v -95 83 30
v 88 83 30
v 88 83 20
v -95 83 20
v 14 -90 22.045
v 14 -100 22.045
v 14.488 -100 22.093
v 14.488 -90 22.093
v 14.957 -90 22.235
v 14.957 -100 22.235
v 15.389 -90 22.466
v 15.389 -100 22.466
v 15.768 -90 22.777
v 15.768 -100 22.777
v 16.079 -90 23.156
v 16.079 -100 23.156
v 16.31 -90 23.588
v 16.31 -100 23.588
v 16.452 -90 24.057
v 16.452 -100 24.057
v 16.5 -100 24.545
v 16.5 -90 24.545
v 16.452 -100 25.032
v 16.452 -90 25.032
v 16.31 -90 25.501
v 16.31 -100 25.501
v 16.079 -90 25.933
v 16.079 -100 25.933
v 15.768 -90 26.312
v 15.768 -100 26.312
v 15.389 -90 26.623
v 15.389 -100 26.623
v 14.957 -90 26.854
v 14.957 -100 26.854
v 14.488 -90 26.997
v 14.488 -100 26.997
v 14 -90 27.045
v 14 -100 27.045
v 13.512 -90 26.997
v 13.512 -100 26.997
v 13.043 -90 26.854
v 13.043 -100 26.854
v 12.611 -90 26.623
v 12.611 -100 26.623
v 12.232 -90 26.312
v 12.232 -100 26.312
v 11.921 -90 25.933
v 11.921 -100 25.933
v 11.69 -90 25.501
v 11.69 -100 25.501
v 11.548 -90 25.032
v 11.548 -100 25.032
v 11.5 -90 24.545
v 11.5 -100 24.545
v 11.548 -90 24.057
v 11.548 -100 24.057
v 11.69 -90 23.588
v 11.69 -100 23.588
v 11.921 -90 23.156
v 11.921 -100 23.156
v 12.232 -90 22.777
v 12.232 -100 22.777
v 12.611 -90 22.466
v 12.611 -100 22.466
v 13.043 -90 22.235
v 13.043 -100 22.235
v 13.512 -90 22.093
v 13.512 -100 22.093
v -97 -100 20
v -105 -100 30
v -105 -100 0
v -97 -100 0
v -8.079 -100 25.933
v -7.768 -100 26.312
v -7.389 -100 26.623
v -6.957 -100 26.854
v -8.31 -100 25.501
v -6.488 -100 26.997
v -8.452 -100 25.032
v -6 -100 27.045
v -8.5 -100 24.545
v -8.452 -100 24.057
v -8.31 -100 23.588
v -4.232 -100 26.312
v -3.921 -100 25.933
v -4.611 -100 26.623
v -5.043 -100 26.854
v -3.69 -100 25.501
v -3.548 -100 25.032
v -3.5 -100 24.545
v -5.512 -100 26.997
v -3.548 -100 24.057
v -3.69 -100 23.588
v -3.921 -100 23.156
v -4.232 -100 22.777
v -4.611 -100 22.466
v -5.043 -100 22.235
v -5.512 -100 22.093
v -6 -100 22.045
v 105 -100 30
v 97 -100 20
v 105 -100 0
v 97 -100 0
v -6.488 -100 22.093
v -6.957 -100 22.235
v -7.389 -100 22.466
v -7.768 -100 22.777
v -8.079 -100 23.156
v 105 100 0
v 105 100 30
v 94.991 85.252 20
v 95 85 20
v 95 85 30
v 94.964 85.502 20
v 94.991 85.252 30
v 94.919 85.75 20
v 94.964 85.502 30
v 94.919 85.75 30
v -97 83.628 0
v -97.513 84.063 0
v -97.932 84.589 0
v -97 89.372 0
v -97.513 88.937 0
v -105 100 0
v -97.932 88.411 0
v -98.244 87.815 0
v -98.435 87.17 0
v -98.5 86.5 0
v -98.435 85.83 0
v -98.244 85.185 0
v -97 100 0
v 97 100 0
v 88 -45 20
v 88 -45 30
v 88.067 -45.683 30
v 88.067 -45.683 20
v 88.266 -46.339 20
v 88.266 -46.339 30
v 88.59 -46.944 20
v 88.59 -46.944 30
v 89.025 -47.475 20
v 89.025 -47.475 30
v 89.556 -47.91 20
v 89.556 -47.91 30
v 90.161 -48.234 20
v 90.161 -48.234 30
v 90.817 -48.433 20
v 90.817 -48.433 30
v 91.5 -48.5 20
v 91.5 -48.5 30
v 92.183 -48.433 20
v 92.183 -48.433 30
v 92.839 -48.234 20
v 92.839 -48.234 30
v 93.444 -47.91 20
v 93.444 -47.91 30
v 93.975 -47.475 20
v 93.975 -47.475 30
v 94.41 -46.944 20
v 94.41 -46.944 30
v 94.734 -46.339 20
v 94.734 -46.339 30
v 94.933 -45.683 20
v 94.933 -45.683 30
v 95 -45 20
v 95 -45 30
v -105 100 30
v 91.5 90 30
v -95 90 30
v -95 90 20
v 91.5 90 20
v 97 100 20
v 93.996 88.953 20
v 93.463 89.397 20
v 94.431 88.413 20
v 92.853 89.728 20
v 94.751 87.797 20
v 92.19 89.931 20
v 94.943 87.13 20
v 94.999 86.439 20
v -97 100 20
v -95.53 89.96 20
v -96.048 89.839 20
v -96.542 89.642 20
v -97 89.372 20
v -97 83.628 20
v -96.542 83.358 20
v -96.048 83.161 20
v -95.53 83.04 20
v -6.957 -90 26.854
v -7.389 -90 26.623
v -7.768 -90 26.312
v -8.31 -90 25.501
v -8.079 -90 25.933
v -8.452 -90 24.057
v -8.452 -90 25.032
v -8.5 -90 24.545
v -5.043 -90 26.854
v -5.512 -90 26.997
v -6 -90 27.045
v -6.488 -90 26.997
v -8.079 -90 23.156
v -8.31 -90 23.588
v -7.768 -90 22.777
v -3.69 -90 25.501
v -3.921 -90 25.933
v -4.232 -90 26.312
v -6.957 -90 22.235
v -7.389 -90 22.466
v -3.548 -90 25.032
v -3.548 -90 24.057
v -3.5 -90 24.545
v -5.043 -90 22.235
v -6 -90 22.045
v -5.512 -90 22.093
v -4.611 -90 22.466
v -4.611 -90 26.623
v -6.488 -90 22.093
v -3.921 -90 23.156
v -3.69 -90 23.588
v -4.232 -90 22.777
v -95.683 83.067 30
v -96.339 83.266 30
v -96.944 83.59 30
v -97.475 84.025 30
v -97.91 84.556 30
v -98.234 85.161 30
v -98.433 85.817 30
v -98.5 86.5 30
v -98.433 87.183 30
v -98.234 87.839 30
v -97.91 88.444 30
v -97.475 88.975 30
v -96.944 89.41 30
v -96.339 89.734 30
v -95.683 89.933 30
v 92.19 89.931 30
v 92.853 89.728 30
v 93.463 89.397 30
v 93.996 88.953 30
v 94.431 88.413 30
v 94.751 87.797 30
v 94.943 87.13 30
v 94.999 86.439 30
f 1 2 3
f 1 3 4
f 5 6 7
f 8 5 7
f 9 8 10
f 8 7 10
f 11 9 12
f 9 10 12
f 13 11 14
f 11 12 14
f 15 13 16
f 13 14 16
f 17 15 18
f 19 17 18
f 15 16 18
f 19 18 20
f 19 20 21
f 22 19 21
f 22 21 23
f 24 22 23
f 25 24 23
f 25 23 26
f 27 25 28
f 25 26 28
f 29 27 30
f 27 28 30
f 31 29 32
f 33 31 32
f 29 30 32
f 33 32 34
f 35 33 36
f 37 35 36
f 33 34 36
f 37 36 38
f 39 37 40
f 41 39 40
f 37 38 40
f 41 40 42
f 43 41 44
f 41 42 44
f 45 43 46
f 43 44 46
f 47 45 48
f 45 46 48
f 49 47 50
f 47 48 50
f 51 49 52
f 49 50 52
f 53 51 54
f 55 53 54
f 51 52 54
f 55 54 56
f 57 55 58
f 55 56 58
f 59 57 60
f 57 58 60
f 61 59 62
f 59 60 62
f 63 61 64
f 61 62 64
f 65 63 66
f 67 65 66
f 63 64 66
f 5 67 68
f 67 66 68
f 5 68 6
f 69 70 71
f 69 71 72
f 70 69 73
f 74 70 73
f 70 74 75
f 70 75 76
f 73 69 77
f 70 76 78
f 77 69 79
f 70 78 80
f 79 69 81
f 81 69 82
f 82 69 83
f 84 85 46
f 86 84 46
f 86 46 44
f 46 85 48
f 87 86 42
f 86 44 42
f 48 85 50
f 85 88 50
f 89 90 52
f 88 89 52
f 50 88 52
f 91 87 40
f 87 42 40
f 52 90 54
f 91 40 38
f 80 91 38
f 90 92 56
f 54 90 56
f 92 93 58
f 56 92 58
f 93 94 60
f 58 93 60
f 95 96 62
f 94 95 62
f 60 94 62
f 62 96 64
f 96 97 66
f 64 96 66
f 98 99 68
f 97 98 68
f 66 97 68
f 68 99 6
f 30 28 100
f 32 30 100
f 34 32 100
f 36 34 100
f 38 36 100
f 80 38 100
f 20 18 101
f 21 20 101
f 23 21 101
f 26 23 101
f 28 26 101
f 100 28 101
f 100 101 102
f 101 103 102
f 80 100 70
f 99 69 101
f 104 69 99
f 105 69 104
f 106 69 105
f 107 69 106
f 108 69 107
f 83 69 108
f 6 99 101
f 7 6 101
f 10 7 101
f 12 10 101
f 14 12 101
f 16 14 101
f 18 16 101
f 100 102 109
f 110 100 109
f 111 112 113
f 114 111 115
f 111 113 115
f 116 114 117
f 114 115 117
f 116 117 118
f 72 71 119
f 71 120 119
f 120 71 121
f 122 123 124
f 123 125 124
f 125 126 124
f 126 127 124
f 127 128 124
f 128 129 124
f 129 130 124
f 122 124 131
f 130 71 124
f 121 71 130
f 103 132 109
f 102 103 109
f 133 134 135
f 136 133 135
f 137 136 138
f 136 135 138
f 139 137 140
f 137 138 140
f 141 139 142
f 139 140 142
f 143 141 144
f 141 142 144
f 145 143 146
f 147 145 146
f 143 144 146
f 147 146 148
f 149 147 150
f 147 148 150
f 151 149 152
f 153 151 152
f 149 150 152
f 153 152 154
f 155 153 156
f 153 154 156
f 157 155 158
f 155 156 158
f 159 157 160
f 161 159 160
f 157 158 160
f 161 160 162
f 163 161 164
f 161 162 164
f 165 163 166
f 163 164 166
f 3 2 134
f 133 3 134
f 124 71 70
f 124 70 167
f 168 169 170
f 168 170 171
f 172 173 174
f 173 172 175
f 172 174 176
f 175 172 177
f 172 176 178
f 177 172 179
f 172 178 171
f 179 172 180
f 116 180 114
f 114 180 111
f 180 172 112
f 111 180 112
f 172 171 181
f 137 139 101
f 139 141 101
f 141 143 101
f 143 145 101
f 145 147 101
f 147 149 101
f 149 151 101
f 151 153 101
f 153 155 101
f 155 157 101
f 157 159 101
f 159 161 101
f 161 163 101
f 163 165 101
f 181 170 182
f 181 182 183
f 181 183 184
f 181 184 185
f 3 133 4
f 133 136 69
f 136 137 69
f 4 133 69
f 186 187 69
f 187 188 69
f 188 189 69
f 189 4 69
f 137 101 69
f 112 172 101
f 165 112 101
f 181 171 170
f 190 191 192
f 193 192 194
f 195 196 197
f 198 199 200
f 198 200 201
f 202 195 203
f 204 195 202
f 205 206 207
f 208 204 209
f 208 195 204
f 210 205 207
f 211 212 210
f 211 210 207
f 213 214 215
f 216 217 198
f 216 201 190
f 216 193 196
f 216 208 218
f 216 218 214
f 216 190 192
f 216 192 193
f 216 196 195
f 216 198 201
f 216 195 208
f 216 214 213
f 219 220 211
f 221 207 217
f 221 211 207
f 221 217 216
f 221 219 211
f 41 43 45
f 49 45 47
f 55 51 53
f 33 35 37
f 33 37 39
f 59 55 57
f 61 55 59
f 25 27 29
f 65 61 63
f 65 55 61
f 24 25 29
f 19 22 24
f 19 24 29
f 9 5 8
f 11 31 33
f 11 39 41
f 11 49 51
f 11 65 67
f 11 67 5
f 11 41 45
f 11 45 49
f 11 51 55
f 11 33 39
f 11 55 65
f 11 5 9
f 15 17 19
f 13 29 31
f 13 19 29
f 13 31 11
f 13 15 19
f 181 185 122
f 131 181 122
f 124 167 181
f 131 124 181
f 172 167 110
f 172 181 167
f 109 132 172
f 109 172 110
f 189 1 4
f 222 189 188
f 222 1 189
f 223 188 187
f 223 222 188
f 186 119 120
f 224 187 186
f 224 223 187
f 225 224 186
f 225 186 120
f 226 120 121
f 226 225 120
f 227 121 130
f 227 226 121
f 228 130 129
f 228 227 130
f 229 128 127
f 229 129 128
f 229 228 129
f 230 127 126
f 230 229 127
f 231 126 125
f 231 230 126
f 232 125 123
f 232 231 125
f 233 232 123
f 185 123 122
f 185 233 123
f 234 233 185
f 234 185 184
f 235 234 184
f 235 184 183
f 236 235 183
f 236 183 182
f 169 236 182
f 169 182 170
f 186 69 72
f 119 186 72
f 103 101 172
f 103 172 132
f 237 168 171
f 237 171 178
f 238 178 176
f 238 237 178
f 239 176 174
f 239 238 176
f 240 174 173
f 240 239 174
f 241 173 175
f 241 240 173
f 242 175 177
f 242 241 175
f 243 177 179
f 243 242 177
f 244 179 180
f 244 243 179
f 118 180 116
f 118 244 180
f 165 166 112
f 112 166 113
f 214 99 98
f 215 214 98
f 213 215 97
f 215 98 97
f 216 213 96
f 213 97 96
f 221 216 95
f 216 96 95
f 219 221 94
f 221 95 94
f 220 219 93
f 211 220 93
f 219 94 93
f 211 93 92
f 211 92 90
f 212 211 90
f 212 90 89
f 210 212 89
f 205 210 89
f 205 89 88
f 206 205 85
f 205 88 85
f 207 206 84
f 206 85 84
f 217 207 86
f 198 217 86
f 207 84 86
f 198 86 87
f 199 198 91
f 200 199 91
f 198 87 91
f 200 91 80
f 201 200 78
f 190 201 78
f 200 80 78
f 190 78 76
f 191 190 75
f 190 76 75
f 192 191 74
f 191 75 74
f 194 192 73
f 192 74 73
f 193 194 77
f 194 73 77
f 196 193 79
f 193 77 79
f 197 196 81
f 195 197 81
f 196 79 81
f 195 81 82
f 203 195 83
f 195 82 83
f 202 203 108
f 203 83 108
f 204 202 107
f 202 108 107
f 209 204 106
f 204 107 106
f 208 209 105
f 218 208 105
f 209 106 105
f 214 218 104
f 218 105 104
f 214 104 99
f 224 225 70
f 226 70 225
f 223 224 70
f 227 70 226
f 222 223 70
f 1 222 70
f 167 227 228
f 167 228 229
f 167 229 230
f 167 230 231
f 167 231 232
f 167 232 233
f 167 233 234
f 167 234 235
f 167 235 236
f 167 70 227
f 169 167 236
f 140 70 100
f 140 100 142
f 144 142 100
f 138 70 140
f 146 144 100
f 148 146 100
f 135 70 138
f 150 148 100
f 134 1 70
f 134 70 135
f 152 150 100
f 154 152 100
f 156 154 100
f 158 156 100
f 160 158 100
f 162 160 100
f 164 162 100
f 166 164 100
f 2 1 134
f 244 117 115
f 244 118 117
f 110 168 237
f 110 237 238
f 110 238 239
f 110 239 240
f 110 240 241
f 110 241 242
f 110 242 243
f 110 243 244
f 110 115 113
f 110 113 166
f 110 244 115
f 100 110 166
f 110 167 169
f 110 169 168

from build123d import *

# Parameters (mm, degrees)
SKETCH1_W           = 210
SKETCH1_H           = 200
BOSS_EXTRUDE1_DEPTH = 30
SKETCH2_W           = 194
SKETCH2_H           = 20
CUT_EXTRUDE1_DEPTH  = 228.870577302
CUT_EXTRUDE2_DEPTH  = 149.07092895
CUT_EXTRUDE3_DEPTH  = 149.07092895
SKETCH5_R           = 2.5
CUT_EXTRUDE4_DEPTH  = 10


with BuildPart() as part:
    # Sketch1 → Boss-Extrude1 (new body)
    with BuildSketch(Plane.XY):
        Rectangle(SKETCH1_W, SKETCH1_H)
    extrude(amount=BOSS_EXTRUDE1_DEPTH)

    # Sketch2 → Cut-Extrude1 (cut, through all)
    with BuildSketch(Plane(origin=(0, -100, 0), x_dir=(-1, 0, 0), z_dir=(0, -1, 0))):
        with Locations((0, -10)):
            Rectangle(SKETCH2_W, SKETCH2_H)
    extrude(amount=-CUT_EXTRUDE1_DEPTH, mode=Mode.SUBTRACT)

    # Sketch3 → Cut-Extrude2 (cut, through all)
    with BuildSketch(Plane.XY.offset(30)):
        with BuildLine():
            Line((88, 85), (88, -45))
            ThreePointArc((88, -45), (91.5, -48.5), (95, -45))
            Line((95, -45), (95, 85))
            ThreePointArc((95, 85), (91.5, 88.5), (88, 85))
        make_face()
    extrude(amount=-CUT_EXTRUDE2_DEPTH, mode=Mode.SUBTRACT)

    # Sketch4 → Cut-Extrude3 (cut, through all)
    with BuildSketch(Plane.XY.offset(30)):
        with BuildLine():
            Line((91.5, 83), (-95, 83))
            ThreePointArc((-95, 83), (-98.5, 86.5), (-95, 90))
            Line((-95, 90), (91.5, 90))
            ThreePointArc((91.5, 90), (95, 86.5), (91.5, 83))
        make_face()
    extrude(amount=-CUT_EXTRUDE3_DEPTH, mode=Mode.SUBTRACT)

    # Sketch5 → Cut-Extrude4 (cut)
    with BuildSketch(Plane.XZ.offset(100)):
        with Locations(Location((-6, 24.544570078, 0), (0, 0, 270))):
            Circle(SKETCH5_R)
        with Locations(Location((14, 24.544570078, 0), (0, 0, 270))):
            Circle(SKETCH5_R)
    extrude(amount=-CUT_EXTRUDE4_DEPTH, mode=Mode.SUBTRACT)


solid = part.part
